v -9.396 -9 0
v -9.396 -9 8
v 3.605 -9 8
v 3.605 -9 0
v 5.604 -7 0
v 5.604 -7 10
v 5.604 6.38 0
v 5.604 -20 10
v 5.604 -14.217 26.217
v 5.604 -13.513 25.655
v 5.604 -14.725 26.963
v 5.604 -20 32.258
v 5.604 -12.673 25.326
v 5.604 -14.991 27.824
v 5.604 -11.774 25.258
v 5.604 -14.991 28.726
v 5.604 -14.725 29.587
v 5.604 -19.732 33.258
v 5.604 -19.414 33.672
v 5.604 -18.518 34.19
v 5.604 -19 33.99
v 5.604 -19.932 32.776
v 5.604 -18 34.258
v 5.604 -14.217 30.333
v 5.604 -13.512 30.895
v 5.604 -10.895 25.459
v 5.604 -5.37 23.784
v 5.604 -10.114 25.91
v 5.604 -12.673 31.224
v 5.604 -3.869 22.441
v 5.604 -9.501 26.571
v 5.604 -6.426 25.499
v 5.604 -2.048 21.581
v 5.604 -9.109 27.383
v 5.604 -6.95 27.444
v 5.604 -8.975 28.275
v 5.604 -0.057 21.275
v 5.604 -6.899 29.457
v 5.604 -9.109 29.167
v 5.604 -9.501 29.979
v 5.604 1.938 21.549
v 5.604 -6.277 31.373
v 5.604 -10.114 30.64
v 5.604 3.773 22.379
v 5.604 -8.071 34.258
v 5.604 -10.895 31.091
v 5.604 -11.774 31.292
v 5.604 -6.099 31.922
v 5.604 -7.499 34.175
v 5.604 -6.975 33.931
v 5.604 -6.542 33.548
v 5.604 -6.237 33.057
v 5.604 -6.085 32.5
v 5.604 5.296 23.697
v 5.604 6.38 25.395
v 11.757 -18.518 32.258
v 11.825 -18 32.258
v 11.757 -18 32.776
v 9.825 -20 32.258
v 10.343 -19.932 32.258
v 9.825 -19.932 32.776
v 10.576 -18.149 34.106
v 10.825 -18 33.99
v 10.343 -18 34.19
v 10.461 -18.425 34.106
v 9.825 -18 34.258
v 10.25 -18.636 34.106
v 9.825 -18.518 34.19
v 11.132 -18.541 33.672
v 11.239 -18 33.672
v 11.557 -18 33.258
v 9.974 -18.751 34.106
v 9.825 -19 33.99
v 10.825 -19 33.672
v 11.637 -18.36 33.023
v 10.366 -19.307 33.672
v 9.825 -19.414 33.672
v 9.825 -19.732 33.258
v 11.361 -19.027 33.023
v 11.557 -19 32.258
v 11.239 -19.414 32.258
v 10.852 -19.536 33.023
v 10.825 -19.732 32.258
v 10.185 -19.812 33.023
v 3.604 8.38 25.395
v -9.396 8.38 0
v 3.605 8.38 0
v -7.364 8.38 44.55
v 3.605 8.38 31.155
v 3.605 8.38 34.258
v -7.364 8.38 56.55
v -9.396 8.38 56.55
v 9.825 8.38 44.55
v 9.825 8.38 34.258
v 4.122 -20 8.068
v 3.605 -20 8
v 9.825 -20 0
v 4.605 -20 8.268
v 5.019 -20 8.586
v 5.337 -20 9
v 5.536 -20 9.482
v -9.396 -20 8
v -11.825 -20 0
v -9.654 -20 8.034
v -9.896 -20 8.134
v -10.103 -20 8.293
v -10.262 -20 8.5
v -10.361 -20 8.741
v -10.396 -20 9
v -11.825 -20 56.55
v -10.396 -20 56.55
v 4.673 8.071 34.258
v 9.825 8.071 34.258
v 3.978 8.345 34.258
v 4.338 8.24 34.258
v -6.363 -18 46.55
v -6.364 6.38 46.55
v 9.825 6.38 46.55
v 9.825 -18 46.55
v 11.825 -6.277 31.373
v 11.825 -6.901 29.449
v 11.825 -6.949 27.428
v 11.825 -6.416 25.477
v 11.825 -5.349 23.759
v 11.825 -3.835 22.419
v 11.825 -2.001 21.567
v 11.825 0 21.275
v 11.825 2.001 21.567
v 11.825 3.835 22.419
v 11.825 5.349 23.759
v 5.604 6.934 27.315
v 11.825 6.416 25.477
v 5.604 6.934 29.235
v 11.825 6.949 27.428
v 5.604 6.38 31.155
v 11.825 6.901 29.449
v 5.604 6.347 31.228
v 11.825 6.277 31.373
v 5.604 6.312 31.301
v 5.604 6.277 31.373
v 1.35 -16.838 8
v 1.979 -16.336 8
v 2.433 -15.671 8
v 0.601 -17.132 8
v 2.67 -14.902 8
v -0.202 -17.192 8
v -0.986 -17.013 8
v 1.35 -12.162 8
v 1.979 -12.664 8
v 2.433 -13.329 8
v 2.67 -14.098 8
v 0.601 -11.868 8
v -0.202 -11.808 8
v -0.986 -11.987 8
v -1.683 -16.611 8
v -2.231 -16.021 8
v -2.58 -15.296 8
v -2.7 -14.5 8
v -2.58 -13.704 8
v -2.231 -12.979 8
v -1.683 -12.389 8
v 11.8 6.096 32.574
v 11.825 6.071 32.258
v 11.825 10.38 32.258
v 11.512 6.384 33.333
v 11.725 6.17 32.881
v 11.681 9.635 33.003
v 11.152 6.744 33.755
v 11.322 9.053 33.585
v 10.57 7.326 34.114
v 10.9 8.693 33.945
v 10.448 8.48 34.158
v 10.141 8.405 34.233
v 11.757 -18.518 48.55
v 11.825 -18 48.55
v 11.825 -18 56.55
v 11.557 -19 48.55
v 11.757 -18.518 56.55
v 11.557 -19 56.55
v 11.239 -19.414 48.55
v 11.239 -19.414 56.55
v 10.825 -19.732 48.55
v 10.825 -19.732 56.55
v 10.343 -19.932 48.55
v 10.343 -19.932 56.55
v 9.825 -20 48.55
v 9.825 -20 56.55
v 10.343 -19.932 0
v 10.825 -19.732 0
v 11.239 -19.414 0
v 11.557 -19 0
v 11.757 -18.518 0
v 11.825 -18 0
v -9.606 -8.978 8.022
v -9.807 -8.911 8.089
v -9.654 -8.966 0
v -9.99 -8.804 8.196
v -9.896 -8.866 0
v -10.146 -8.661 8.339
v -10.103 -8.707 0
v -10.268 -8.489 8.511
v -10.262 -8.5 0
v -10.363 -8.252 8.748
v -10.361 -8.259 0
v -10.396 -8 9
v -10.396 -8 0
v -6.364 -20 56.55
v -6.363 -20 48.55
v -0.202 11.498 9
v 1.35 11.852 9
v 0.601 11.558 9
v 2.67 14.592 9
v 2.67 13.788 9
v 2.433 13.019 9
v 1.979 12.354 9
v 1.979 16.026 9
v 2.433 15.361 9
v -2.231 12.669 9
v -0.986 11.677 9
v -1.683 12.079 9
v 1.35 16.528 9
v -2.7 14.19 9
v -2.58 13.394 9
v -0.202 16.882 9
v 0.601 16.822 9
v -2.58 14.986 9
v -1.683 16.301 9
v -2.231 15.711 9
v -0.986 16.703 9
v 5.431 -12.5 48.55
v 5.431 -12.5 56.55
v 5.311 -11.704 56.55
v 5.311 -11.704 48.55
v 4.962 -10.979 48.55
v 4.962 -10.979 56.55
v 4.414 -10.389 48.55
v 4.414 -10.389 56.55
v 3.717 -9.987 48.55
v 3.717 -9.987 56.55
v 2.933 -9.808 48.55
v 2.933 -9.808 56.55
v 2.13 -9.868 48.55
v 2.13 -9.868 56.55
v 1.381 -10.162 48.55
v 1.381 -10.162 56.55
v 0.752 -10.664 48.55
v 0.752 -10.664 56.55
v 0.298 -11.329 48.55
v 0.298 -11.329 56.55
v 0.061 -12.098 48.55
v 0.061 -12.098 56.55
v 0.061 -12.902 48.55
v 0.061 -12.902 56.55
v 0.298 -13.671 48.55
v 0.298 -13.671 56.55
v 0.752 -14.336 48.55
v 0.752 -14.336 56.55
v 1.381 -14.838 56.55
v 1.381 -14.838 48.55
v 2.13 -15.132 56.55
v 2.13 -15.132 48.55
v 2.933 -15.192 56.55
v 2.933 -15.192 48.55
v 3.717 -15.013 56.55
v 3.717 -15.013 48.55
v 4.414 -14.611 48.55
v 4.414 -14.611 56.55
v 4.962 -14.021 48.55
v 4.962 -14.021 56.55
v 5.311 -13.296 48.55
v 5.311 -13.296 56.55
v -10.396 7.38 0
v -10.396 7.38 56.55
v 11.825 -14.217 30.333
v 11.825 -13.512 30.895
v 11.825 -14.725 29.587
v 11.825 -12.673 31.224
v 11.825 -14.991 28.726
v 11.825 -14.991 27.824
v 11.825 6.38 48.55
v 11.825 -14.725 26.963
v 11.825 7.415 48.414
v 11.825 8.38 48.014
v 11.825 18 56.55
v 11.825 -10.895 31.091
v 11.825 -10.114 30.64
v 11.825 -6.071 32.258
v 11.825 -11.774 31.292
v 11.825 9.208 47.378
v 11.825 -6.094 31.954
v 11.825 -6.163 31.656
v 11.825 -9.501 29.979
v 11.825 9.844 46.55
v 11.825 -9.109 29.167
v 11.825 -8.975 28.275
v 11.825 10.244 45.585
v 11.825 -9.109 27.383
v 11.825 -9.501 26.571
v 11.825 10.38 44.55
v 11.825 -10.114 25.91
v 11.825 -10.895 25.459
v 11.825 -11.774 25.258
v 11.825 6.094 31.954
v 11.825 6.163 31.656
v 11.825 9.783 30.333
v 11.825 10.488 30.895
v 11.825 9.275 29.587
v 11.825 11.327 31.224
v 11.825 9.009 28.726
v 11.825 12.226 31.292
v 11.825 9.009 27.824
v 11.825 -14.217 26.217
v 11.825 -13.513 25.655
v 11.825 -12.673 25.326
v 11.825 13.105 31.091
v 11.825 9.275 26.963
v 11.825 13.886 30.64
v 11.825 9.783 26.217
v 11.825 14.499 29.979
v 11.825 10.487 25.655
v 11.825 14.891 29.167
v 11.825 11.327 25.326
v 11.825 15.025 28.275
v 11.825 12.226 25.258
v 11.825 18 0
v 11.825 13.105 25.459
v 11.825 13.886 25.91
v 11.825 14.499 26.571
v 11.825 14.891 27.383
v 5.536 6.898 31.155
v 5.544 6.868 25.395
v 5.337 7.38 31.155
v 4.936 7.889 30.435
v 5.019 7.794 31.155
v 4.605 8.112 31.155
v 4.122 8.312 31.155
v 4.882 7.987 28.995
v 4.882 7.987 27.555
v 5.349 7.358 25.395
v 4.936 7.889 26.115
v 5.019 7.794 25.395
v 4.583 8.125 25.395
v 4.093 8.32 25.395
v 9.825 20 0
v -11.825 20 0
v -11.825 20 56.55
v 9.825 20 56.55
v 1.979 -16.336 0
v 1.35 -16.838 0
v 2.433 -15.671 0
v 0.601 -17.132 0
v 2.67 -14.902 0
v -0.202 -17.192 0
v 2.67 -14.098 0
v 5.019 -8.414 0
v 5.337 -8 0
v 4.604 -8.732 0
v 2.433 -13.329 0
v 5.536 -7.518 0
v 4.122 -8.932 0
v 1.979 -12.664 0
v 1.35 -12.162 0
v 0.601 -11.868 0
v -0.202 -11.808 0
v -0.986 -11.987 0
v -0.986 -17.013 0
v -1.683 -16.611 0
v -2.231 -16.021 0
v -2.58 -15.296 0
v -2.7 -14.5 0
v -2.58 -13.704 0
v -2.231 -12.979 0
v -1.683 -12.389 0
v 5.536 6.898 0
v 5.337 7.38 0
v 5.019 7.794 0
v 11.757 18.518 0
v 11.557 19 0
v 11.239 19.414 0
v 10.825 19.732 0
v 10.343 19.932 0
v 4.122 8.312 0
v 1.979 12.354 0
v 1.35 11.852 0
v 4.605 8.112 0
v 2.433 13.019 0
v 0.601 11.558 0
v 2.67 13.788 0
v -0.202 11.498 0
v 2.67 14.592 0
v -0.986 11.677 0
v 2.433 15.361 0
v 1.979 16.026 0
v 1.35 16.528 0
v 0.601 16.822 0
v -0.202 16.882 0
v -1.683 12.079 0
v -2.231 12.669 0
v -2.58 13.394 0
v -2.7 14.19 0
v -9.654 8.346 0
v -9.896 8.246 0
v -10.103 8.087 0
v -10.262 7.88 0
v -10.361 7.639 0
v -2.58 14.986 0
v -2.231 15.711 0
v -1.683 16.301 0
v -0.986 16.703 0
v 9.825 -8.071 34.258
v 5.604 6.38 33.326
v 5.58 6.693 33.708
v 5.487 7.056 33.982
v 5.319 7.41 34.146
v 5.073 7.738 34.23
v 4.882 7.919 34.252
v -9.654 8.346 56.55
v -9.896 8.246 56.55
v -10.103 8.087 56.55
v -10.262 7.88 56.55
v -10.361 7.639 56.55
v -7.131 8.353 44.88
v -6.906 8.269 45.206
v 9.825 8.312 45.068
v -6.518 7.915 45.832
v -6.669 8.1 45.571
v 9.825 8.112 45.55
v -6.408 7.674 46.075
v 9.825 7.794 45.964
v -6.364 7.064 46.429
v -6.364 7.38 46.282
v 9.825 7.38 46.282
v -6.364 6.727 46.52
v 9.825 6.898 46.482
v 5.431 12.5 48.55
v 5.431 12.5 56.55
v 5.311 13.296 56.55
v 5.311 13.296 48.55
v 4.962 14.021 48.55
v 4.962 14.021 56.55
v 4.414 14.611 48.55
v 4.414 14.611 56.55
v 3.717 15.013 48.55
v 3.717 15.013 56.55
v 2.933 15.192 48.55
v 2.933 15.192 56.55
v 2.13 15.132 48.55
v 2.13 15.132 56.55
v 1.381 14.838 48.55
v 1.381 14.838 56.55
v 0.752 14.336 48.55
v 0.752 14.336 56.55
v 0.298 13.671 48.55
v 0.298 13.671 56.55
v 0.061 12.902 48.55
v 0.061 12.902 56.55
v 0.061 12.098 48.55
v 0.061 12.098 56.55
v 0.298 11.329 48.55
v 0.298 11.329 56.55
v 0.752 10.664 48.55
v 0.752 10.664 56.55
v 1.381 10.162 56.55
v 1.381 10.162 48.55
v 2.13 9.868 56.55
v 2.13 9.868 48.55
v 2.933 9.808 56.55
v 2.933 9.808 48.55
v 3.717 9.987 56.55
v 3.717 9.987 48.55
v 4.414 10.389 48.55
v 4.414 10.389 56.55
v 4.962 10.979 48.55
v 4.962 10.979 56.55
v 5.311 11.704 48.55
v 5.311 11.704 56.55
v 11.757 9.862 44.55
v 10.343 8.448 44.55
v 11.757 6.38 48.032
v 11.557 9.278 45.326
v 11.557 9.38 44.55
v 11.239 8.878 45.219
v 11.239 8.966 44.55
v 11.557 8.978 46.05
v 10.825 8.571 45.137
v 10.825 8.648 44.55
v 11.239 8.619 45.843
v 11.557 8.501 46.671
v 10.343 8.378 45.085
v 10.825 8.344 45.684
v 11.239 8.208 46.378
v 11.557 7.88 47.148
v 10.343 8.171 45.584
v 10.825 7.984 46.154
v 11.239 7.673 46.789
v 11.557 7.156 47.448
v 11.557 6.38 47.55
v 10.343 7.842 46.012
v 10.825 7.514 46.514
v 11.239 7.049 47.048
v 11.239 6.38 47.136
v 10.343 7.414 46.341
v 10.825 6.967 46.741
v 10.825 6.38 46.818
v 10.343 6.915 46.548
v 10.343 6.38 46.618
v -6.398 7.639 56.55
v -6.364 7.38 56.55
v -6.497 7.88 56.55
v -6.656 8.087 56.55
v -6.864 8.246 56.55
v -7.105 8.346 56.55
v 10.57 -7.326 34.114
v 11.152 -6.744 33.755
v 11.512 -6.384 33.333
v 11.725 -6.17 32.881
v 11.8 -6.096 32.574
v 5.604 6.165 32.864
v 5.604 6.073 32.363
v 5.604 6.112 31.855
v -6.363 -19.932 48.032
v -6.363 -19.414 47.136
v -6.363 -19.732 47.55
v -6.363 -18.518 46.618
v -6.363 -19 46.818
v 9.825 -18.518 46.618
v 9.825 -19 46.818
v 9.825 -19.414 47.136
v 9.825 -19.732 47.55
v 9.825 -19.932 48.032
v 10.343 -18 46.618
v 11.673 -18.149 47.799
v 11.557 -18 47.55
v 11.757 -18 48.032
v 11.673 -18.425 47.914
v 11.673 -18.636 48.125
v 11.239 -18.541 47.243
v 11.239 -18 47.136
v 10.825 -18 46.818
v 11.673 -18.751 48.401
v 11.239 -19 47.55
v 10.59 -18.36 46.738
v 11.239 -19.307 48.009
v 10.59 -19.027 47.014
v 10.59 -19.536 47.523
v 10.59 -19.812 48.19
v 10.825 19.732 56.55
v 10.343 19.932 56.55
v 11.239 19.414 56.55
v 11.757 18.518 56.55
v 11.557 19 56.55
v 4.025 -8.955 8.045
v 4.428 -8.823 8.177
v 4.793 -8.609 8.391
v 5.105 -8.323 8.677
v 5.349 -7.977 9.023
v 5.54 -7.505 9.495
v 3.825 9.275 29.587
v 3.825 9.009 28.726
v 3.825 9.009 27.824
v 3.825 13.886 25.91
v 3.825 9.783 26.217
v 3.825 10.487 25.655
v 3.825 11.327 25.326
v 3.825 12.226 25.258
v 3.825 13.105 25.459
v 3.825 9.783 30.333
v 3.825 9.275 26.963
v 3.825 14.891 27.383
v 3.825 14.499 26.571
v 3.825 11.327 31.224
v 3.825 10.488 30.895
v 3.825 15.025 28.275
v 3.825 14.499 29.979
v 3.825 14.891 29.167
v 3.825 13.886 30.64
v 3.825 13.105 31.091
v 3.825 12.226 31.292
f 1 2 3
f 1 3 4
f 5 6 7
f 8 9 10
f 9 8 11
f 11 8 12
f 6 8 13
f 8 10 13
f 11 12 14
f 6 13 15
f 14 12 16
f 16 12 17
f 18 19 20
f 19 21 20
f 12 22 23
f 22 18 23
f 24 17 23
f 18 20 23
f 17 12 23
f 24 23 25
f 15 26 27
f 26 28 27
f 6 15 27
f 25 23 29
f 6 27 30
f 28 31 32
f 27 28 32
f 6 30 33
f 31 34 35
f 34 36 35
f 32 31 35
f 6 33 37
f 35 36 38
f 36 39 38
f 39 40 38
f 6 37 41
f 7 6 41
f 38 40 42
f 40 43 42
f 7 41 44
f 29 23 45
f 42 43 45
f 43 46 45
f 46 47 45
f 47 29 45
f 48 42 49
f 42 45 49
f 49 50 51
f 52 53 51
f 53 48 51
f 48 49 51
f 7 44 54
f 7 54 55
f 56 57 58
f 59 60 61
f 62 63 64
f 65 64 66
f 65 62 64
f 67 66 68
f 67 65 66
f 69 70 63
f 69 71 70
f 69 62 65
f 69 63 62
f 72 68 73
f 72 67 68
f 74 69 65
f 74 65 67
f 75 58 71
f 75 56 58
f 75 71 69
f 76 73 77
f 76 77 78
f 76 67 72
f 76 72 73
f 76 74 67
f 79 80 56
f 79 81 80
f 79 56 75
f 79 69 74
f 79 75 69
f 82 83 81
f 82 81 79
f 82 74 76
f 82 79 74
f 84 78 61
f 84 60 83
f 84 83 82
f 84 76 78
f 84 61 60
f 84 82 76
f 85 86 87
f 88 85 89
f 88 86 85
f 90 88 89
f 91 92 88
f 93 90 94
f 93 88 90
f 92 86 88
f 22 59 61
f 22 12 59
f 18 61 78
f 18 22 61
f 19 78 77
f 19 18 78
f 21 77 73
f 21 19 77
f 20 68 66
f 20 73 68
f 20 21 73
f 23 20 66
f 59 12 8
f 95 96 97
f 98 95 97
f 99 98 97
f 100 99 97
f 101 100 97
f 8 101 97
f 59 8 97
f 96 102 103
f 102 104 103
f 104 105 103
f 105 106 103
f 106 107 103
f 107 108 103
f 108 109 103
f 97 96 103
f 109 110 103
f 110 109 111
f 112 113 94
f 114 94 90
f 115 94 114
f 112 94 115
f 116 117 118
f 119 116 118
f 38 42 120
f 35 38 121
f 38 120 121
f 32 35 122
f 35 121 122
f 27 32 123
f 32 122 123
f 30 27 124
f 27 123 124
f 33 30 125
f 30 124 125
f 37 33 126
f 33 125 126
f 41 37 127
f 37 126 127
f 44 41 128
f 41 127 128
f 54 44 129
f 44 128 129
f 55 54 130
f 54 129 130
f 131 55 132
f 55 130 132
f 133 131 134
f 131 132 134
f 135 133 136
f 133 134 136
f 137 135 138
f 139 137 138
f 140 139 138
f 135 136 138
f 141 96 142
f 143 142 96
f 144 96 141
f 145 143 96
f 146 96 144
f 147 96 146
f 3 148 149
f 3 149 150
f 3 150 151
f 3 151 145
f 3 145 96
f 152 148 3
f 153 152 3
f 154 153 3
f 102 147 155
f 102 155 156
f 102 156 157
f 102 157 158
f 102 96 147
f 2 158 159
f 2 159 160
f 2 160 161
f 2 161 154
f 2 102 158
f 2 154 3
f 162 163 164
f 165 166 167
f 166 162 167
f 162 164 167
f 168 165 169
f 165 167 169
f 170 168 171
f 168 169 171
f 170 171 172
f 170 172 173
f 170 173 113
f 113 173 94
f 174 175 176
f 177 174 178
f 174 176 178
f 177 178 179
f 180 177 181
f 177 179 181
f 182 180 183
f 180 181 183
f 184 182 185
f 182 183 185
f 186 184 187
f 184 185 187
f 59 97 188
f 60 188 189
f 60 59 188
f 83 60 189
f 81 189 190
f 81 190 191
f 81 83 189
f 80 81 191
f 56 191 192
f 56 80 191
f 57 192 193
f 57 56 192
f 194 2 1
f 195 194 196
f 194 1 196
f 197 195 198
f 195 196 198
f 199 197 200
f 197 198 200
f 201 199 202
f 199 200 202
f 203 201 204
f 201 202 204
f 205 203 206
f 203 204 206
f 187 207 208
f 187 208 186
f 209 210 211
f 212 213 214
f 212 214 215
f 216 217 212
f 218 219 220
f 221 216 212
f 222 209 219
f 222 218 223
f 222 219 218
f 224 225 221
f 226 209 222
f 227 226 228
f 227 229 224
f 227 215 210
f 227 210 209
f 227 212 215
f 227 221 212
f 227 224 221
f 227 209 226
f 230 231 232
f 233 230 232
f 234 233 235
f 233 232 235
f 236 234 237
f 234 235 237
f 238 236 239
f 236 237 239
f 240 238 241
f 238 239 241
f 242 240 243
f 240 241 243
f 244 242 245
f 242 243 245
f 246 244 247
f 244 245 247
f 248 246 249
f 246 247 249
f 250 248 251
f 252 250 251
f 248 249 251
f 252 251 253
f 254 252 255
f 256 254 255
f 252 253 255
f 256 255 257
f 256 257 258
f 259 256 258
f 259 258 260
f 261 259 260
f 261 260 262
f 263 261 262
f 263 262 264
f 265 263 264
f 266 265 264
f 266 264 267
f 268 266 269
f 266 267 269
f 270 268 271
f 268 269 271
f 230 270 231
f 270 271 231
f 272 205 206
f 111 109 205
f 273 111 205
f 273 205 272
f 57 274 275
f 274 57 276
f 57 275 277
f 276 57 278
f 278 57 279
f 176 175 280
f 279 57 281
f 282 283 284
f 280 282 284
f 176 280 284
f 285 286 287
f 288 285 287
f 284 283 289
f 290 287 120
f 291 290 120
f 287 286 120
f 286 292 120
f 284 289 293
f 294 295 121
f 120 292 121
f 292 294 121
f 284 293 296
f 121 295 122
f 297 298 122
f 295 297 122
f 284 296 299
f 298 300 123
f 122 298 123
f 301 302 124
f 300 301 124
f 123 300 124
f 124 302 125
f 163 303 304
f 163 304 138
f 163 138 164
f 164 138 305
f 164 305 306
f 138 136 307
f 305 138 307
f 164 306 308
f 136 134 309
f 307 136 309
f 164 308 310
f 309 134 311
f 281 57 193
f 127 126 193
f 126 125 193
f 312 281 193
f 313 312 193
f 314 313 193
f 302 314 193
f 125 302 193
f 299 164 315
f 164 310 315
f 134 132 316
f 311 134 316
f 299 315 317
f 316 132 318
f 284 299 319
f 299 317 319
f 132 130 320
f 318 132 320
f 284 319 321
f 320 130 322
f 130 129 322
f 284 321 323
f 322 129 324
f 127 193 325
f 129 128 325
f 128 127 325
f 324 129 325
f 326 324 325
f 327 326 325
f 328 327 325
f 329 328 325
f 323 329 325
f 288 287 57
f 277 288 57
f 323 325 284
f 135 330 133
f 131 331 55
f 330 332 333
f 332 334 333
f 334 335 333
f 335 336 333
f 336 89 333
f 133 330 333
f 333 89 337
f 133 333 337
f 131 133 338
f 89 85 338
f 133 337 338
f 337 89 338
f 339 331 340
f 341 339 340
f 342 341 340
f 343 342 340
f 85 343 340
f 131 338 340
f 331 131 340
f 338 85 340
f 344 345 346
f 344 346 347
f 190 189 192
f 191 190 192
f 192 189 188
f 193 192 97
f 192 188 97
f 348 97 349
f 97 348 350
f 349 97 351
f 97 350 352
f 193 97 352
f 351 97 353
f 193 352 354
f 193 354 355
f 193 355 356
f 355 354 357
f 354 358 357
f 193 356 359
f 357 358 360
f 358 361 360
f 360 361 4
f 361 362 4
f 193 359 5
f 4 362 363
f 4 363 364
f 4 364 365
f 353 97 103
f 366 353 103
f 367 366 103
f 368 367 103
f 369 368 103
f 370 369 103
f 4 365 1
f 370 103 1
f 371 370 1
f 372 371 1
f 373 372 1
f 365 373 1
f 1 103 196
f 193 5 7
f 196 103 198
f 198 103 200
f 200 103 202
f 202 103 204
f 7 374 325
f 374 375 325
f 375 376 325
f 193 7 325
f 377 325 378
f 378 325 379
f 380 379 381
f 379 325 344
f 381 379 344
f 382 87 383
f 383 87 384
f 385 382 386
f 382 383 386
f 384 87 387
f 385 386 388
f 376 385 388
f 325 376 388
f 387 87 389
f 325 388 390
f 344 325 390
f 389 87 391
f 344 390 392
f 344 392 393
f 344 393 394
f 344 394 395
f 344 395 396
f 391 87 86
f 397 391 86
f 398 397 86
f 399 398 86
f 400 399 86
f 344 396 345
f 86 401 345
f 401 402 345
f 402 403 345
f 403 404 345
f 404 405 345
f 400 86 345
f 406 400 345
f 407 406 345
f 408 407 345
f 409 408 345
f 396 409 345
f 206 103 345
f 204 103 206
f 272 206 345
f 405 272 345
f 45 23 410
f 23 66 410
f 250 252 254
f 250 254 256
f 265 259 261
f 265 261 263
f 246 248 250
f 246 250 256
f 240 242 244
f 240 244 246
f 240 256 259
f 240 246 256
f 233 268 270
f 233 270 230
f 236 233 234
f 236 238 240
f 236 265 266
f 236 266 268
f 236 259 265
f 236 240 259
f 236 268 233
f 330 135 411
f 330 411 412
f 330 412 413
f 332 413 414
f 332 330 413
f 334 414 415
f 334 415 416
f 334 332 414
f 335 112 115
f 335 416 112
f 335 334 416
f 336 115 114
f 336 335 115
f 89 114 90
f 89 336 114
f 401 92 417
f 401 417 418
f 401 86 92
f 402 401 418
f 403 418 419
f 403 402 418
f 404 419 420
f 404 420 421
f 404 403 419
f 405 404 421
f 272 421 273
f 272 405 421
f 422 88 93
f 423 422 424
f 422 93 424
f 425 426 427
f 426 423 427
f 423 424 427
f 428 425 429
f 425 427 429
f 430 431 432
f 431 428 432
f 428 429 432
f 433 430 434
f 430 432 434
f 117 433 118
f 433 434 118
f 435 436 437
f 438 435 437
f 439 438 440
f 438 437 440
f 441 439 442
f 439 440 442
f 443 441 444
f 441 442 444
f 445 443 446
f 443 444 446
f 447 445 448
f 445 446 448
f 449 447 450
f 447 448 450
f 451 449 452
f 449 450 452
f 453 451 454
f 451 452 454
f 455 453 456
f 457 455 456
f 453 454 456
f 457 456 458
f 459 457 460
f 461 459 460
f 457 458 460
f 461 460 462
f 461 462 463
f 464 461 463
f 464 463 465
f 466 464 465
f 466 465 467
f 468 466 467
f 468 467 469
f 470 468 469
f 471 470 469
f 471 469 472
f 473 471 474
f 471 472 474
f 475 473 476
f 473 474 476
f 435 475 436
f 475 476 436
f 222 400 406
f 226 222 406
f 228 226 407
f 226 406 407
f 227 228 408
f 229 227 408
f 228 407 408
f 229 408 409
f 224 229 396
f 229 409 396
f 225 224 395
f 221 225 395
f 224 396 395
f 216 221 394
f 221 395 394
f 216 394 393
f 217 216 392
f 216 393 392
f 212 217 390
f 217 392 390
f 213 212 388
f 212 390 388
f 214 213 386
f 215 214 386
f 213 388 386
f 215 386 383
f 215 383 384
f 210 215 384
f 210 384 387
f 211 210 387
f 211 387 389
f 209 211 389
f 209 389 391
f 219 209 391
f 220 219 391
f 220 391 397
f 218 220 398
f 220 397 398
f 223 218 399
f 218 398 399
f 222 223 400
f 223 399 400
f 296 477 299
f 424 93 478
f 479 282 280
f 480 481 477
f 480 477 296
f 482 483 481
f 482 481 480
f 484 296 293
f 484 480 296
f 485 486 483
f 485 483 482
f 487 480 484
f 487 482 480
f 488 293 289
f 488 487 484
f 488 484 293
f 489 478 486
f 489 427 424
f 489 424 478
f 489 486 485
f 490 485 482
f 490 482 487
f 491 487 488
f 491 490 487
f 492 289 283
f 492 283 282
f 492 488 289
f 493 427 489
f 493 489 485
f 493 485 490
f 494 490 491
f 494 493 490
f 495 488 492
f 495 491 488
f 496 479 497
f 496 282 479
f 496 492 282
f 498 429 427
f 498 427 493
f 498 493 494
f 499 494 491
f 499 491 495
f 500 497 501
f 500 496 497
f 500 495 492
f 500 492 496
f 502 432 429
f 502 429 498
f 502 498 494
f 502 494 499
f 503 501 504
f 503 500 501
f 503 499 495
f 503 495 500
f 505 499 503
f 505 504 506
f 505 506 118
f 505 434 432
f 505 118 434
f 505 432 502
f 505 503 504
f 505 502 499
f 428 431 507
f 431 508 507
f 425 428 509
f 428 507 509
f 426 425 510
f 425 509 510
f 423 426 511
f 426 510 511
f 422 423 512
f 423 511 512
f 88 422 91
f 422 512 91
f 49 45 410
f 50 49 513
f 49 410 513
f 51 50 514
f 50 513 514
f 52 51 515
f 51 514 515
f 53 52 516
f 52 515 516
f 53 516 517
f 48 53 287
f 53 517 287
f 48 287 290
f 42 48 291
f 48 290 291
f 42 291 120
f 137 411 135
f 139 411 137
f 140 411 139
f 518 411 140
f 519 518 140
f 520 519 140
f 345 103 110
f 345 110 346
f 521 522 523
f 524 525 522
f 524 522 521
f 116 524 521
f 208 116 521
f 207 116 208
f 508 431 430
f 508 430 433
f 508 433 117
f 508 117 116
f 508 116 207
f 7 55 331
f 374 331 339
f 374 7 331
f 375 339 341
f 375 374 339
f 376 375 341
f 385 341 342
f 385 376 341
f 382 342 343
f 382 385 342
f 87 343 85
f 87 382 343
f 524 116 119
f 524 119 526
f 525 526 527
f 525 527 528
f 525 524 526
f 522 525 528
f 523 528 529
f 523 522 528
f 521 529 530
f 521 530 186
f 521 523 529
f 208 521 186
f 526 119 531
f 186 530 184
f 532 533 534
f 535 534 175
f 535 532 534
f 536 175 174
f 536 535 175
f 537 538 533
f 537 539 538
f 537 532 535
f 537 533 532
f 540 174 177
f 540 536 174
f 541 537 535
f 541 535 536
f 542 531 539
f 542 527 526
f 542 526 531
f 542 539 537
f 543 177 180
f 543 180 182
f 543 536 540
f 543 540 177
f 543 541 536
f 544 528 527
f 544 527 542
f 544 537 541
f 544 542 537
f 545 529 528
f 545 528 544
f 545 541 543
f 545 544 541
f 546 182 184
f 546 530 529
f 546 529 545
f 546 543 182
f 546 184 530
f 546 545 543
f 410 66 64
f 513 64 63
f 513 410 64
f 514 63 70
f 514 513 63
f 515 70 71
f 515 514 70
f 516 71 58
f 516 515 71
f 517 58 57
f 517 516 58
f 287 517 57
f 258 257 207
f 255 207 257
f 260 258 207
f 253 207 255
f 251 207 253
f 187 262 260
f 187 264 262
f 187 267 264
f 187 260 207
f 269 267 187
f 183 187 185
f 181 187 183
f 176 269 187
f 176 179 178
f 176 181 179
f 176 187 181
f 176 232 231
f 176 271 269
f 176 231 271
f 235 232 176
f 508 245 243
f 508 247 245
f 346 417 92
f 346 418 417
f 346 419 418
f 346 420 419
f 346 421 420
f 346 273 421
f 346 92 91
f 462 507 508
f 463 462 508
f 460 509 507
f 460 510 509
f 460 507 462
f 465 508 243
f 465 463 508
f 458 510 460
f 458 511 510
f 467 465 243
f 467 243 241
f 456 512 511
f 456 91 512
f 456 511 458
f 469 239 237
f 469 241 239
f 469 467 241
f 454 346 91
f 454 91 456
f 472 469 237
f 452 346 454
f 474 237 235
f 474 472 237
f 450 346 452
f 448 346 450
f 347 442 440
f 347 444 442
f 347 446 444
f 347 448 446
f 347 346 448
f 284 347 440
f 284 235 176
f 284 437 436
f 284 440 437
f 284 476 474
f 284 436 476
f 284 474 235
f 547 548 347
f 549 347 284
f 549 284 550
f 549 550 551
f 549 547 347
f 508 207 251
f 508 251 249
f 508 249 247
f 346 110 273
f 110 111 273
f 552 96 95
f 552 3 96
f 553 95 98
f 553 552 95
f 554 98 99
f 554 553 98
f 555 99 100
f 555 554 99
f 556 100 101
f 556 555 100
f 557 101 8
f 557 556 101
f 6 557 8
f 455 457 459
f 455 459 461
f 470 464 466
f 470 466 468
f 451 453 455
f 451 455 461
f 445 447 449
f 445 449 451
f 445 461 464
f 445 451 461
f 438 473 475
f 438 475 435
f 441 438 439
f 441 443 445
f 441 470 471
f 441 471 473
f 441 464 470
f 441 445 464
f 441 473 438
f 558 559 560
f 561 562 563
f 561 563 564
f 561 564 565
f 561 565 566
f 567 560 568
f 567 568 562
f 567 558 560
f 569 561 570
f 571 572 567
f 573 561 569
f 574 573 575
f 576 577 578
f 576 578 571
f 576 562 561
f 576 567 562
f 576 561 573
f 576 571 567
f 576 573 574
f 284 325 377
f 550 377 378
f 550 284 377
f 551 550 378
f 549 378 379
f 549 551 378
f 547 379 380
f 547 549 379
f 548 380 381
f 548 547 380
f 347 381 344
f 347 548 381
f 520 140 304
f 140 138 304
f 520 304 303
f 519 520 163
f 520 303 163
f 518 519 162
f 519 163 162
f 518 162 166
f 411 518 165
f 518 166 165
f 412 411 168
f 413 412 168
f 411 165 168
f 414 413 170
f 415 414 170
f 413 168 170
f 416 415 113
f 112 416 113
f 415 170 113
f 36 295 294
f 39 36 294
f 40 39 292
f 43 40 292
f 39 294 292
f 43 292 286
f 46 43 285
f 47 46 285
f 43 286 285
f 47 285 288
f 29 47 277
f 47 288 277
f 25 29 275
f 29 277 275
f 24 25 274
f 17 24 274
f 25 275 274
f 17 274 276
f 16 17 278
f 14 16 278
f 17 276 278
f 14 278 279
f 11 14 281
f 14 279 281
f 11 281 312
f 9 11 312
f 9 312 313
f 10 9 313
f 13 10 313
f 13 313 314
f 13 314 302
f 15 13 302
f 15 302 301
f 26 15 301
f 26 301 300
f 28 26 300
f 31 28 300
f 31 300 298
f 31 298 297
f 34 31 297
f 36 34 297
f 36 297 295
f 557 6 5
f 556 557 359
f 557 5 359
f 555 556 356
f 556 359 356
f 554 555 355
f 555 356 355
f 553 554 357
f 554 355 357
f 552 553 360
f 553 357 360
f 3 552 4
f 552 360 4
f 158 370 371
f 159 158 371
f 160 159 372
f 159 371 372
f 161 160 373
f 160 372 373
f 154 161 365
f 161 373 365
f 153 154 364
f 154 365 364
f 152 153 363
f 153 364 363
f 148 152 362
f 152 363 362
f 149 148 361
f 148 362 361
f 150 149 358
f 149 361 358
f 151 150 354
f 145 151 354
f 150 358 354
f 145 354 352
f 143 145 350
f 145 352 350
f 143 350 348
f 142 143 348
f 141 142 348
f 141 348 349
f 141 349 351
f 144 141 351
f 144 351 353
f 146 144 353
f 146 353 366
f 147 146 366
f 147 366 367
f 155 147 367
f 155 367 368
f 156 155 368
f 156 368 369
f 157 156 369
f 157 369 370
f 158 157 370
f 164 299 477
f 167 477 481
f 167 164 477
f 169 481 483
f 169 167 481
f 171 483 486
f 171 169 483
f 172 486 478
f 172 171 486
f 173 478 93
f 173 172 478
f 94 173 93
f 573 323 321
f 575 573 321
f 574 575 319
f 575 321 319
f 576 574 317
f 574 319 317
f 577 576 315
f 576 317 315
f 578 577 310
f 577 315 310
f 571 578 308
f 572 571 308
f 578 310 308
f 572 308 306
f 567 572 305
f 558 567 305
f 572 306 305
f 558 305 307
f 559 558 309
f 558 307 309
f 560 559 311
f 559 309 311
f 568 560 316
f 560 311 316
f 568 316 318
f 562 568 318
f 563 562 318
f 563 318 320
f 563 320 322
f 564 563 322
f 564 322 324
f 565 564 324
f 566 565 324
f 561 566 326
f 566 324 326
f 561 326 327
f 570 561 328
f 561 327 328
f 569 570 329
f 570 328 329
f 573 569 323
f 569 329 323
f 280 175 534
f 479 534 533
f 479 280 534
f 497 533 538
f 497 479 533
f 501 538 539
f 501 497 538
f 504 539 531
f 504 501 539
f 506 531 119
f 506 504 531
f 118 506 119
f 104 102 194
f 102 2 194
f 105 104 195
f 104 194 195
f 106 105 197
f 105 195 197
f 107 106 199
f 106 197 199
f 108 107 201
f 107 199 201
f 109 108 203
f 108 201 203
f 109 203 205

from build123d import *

# Parameters (mm, degrees)
SKETCH1_W           = 23.65
SKETCH1_H           = 40
BOSS_EXTRUDE1_DEPTH = 56.55
SKETCH2_W           = 16
SKETCH2_H           = 28.38
CUT_EXTRUDE1_DEPTH  = 62.137002911
SKETCH3_R           = 7
CUT_EXTRUDE2_DEPTH  = 6.2205
SKETCH6_R           = 3.025
CUT_EXTRUDE4_DEPTH  = 8
SKETCH4_W           = 11.968
SKETCH4_H           = 10
BOSS_EXTRUDE2_DEPTH = 28.38
SKETCH5_W           = 12.292
SKETCH5_H           = 28.38
CUT_EXTRUDE3_DEPTH  = 6.2205
FILLET5_R           = 2
SKETCH9_W           = 8
SKETCH9_H           = 11
BOSS_EXTRUDE3_DEPTH = 16
SKETCH8_R           = 2.7
CUT_EXTRUDE6_DEPTH  = 9
SKETCH7_R           = 2.7
CUT_EXTRUDE5_DEPTH  = 8
FILLET4_R           = 2
FILLET8_R           = 1


with BuildPart() as part:
    # Sketch1 → Boss-Extrude1 (new body)
    with BuildSketch(Plane.XY):
        Rectangle(SKETCH1_W, SKETCH1_H)
    extrude(amount=BOSS_EXTRUDE1_DEPTH)

    # Sketch2 → Cut-Extrude1 (cut, through all)
    with BuildSketch(Plane.XY.offset(56.55)):
        with Locations((-2.3955, -5.81)):
            Rectangle(SKETCH2_W, SKETCH2_H)
    extrude(amount=-CUT_EXTRUDE1_DEPTH, mode=Mode.SUBTRACT)

    # Sketch3 → Cut-Extrude2 (cut)
    with BuildSketch(Plane(origin=(11.825, 0, 0), x_dir=(0, 0, -1), z_dir=(1, 0, 0))):
        with Locations(Location((-28.275, 0, 0), (0, 0, 90))):
            Circle(SKETCH3_R)
    extrude(amount=-CUT_EXTRUDE2_DEPTH, mode=Mode.SUBTRACT)

    # Sketch6 → Cut-Extrude4 (cut)
    with BuildSketch(Plane(origin=(11.825, 0, 0), x_dir=(0, 0, -1), z_dir=(1, 0, 0))):
        with Locations(Location((-28.275, 12, 0), (0, 0, 90))):
            Circle(SKETCH6_R)
        with Locations(Location((-28.275, -12, 0), (0, 0, 90))):
            Circle(SKETCH6_R)
    extrude(amount=-CUT_EXTRUDE4_DEPTH, mode=Mode.SUBTRACT)

    # Sketch4 → Boss-Extrude2 (add)
    with BuildSketch(Plane.XZ.offset(-8.38)):
        with Locations((-0.3795, 51.55)):
            Rectangle(SKETCH4_W, SKETCH4_H)
    extrude(amount=BOSS_EXTRUDE2_DEPTH)

    # Sketch5 → Cut-Extrude3 (cut)
    with BuildSketch(Plane(origin=(11.825, 0, 0), x_dir=(0, 0, -1), z_dir=(1, 0, 0))):
        with Locations((-40.404, -5.81)):
            Rectangle(SKETCH5_W, SKETCH5_H)
    extrude(amount=-CUT_EXTRUDE3_DEPTH, mode=Mode.SUBTRACT)

    # Fillet5
    fillet5_edges = [part.edges().sort_by_distance(p)[0] for p in [
        (5.6045, 8.38, 17.129),
    ]]
    fillet(fillet5_edges, radius=FILLET5_R)

    # Sketch9 → Boss-Extrude3 (add)
    with BuildSketch(Plane(origin=(-10.3955, 0, 0), x_dir=(0, 0, -1), z_dir=(1, 0, 0))):
        with Locations((-4, -14.5)):
            Rectangle(SKETCH9_W, SKETCH9_H)
    extrude(amount=BOSS_EXTRUDE3_DEPTH)

    # Sketch8 → Cut-Extrude6 (cut)
    with BuildSketch(Plane(origin=(0, 0, 0), x_dir=(-1, 0, 0), z_dir=(0, 0, -1))):
        with Locations((0, 14.19)):
            Circle(SKETCH8_R)
        with Locations((0, -14.5)):
            Circle(SKETCH8_R)
    extrude(amount=-CUT_EXTRUDE6_DEPTH, mode=Mode.SUBTRACT)

    # Sketch7 → Cut-Extrude5 (cut)
    with BuildSketch(Plane.XY.offset(56.55)):
        with Locations((2.73075, 12.5)):
            Circle(SKETCH7_R)
        with Locations((2.73075, -12.5)):
            Circle(SKETCH7_R)
    extrude(amount=-CUT_EXTRUDE5_DEPTH, mode=Mode.SUBTRACT)

    # Fillet4
    fillet4_edges = [part.edges().sort_by_distance(p)[0] for p in [
        (5.6045, -14.5, 8),
        (5.6045, -9, 4),
        (2.73075, -20, 46.55),
        (2.73075, 8.38, 46.55),
        (8.71475, 3.633691099, 34.258),
        (8.71475, -3.633691099, 34.258),
        (11.825, -20, 17.129),
        (11.825, 8.38, 40.404),
        (11.825, -11.816845549, 34.258),
        (11.825, 6.006845549, 34.258),
        (11.825, -5.81, 46.55),
        (8.71475, -20, 34.258),
        (11.825, -20, 51.55),
        (11.825, 20, 28.275),
    ]]
    fillet(fillet4_edges, radius=FILLET4_R)

    # Fillet8
    fillet8_edges = [part.edges().sort_by_distance(p)[0] for p in [
        (-10.3955, -14.5, 8),
        (-10.3955, -9, 4),
        (-10.3955, 8.38, 28.275),
        (-6.3635, 8.38, 50.55),
    ]]
    fillet(fillet8_edges, radius=FILLET8_R)


solid = part.part
